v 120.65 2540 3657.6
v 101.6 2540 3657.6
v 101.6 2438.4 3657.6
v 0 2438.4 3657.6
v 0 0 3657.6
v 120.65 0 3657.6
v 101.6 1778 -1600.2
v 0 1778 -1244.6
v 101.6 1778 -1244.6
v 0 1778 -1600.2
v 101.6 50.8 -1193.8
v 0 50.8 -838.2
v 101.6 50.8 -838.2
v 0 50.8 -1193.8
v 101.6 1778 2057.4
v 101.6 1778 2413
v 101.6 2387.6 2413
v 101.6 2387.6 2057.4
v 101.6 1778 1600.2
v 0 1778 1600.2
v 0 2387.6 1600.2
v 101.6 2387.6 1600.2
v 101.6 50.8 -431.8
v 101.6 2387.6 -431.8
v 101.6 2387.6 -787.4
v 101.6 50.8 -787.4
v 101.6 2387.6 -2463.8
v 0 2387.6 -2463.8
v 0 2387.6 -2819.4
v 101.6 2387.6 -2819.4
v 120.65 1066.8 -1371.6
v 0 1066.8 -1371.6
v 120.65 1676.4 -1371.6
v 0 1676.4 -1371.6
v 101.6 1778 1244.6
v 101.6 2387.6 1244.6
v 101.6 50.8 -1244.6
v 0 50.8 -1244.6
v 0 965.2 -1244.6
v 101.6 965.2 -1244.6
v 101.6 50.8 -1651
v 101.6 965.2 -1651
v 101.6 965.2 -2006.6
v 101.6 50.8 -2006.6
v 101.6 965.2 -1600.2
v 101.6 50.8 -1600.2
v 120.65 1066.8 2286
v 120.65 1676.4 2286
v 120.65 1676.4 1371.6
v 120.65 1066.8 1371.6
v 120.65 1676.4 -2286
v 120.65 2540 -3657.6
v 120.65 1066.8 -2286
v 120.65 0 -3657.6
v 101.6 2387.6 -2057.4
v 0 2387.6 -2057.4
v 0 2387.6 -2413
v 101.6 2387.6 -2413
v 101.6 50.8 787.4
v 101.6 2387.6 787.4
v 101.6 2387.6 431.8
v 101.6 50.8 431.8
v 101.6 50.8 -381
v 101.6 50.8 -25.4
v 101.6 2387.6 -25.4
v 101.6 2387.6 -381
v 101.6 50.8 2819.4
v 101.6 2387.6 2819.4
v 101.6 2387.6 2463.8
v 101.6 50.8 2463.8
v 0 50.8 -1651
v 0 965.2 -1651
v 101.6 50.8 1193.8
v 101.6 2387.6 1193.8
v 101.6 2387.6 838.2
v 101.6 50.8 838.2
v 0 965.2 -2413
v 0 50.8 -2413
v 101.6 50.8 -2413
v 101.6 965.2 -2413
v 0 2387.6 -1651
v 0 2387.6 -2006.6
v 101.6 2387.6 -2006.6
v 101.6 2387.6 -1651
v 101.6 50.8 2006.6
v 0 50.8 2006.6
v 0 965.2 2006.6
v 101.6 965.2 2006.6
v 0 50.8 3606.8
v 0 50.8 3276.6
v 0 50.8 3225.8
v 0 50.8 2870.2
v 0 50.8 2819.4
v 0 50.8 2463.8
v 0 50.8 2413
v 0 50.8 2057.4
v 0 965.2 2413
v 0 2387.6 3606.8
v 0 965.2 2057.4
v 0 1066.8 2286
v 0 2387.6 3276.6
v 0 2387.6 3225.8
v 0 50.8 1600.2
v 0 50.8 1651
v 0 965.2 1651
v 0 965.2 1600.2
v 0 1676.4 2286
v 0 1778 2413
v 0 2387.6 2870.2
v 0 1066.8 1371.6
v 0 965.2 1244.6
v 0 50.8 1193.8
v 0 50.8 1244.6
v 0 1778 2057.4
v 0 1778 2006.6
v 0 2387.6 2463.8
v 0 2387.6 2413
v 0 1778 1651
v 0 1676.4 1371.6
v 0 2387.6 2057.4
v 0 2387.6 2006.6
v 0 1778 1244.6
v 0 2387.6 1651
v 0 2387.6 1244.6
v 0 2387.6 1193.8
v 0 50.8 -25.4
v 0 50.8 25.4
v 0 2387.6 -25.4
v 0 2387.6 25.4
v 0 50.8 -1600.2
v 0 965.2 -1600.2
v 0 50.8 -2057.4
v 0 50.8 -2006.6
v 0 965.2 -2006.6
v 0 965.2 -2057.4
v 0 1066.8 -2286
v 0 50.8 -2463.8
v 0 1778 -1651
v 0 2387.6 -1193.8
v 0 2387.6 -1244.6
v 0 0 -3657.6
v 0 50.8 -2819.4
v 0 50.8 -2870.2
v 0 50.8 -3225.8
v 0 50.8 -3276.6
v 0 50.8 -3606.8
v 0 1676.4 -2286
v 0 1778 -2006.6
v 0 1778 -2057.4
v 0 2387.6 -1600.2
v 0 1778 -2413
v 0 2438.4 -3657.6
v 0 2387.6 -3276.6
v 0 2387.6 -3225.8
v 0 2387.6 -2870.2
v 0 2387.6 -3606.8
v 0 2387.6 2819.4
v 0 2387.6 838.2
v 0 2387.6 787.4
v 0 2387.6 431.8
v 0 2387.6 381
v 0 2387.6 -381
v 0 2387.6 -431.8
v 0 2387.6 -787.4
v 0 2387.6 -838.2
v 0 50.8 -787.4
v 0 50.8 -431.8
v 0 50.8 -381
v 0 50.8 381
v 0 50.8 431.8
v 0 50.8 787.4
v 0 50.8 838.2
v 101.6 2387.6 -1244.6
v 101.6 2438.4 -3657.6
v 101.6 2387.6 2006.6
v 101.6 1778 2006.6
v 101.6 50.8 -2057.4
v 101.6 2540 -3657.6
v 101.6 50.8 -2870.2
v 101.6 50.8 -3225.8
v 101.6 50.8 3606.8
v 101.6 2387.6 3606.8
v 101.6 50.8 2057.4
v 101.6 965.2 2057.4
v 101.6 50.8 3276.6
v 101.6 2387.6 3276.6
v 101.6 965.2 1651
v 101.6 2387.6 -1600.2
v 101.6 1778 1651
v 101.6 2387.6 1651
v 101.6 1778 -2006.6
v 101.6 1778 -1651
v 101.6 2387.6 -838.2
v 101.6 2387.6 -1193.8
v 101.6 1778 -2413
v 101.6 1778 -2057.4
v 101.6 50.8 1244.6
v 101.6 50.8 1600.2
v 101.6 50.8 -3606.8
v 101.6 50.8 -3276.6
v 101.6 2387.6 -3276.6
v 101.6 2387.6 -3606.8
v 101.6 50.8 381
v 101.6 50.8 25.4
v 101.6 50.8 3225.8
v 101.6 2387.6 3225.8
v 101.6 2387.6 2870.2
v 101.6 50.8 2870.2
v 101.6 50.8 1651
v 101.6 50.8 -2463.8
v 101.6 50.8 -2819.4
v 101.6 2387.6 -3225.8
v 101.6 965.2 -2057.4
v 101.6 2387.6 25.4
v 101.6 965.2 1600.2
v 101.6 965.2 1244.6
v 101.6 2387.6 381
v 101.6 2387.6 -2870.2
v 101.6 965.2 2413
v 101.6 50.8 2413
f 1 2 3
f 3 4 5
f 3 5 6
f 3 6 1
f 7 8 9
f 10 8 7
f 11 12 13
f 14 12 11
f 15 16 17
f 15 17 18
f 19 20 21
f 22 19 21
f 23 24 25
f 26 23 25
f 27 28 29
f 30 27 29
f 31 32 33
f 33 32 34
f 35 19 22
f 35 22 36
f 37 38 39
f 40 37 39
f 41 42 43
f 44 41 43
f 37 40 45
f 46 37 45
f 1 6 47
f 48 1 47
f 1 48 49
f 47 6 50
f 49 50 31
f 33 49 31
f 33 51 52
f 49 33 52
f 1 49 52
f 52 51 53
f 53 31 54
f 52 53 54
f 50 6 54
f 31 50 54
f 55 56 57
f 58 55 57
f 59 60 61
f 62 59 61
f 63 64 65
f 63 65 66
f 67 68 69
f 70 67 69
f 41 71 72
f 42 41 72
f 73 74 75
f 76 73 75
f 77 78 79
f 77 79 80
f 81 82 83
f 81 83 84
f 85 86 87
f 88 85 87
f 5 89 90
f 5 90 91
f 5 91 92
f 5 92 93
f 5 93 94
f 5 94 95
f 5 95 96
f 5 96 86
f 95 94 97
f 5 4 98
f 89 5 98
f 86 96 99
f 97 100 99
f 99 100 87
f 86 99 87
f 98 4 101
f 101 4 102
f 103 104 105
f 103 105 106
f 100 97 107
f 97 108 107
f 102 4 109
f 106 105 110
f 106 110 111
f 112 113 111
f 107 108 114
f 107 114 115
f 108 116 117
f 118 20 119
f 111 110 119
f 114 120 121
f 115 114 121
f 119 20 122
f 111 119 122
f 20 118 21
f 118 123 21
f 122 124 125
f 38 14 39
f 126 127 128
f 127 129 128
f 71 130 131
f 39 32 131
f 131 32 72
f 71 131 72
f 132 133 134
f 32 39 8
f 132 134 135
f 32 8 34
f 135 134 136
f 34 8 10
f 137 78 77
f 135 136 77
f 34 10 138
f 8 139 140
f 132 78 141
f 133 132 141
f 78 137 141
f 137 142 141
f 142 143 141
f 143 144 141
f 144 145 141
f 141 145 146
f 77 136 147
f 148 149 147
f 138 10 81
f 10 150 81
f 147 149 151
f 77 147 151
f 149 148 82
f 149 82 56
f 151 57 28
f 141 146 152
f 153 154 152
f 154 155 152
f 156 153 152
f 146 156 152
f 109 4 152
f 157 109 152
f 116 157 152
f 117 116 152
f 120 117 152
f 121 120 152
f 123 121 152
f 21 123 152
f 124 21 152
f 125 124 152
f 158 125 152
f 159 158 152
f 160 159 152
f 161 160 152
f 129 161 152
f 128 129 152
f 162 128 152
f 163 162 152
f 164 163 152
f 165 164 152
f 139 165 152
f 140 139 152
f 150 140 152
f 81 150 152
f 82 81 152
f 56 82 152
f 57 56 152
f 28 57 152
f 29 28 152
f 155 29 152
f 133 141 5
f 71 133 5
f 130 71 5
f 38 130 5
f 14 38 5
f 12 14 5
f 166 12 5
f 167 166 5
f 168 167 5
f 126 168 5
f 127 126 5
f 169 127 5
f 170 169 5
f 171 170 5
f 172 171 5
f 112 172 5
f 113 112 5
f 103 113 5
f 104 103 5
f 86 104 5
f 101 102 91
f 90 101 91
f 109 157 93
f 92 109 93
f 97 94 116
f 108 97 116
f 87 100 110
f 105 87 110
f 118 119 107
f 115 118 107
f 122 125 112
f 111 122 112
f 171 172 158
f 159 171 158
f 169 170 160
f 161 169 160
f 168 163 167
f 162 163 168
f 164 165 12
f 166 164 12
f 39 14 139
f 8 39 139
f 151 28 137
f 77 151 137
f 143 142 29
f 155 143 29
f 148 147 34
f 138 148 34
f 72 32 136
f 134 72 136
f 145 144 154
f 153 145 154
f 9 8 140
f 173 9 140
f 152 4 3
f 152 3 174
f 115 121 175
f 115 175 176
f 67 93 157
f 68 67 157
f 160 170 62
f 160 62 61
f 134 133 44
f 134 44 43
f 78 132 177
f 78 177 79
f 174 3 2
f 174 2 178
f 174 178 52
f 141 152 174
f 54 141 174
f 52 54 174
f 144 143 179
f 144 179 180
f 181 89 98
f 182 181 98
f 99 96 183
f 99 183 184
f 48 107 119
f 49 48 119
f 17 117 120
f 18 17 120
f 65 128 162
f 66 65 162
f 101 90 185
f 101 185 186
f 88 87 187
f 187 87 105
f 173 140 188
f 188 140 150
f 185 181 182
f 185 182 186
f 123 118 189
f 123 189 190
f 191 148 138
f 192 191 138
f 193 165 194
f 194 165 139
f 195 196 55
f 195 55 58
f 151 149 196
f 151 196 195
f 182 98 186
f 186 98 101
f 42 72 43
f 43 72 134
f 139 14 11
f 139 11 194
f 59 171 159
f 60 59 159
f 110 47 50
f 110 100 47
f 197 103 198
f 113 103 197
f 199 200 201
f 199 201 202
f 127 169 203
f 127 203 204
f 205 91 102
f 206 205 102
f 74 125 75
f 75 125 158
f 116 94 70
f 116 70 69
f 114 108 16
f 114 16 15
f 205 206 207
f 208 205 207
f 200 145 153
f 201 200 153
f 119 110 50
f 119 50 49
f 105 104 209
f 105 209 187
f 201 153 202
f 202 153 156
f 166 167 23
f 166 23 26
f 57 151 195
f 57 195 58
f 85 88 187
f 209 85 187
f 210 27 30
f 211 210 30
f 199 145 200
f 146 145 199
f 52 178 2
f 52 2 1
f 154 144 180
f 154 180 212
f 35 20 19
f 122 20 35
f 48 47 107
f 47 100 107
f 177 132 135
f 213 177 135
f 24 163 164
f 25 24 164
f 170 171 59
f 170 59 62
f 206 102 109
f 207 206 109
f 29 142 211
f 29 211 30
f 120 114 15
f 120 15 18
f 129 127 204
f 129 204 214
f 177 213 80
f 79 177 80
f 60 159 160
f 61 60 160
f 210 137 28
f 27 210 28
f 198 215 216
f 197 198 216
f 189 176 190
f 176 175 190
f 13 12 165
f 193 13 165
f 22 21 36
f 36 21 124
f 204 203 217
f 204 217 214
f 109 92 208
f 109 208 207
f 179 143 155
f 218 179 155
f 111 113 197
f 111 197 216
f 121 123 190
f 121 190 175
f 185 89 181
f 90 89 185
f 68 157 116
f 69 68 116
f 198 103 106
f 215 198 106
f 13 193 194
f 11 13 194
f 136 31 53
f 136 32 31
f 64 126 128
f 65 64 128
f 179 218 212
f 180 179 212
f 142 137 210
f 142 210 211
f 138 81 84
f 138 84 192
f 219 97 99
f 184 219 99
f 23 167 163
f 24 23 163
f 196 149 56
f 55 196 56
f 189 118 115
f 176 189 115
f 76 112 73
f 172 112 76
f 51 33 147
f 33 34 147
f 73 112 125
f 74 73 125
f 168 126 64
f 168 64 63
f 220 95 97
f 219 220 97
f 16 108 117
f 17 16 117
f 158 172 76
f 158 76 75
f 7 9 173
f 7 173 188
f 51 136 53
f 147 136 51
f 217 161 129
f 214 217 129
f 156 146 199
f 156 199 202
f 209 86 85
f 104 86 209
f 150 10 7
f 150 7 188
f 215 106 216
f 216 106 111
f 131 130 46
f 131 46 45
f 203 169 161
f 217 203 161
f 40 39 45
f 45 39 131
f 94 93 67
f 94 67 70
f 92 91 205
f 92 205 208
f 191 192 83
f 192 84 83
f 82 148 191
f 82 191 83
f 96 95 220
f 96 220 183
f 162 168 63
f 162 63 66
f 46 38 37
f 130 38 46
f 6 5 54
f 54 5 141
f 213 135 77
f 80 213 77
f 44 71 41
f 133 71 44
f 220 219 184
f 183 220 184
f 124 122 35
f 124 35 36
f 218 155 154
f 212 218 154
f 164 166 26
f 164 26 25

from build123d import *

# Parameters (mm, degrees)
SKETCH1_W           = 330.2
SKETCH1_H           = 2336.8
SKETCH1_W_2         = 914.4
SKETCH1_H_2         = 609.6
SKETCH1_W_3         = 355.6
SKETCH1_H_3         = 914.4
BOSS_EXTRUDE1_DEPTH = 101.6
SKETCH2_W           = 7315.2
SKETCH2_H           = 2438.4
SKETCH2_W_2         = 914.4
SKETCH2_H_2         = 609.6
BOSS_EXTRUDE2_DEPTH = 19.05
SKETCH3_W           = 19.05
SKETCH3_H           = 7315.2
BOSS_EXTRUDE3_DEPTH = 101.6


with BuildPart() as part:
    # Sketch1 → Boss-Extrude1 (new body)
    with BuildSketch(Plane(origin=(0, 0, 0), x_dir=(0, 0, -1), z_dir=(1, 0, 0))):
        Polygon((0, 0), (3657.6, 0), (3657.6, 2438.4), (-3657.6, 2438.4), (-3657.6, 0), align=None)
        Polygon((1828.8, 1778), (2006.6, 1778), (2006.6, 2387.6), (1651, 2387.6), (1651, 1778), align=None, mode=Mode.SUBTRACT)
        with Locations((-3441.7, 1219.2)):
            Rectangle(SKETCH1_W, SKETCH1_H, mode=Mode.SUBTRACT)
        with Locations((3441.7, 1219.2)):
            Rectangle(SKETCH1_W, SKETCH1_H, mode=Mode.SUBTRACT)
        Polygon((-1828.8, 1778), (-1651, 1778), (-1651, 2387.6), (-2006.6, 2387.6), (-2006.6, 1778), align=None, mode=Mode.SUBTRACT)
        with Locations((-1828.8, 1371.6)):
            Rectangle(SKETCH1_W_2, SKETCH1_H_2, mode=Mode.SUBTRACT)
        Polygon((1828.8, 1676.4), (1371.6, 1676.4), (1371.6, 1066.8), (2286, 1066.8), (2286, 1676.4), align=None, mode=Mode.SUBTRACT)
        with Locations((203.2, 1219.2)):
            Rectangle(SKETCH1_W_3, SKETCH1_H, mode=Mode.SUBTRACT)
        with Locations((-203.2, 1219.2)):
            Rectangle(SKETCH1_W_3, SKETCH1_H, mode=Mode.SUBTRACT)
        with Locations((609.6, 1219.2)):
            Rectangle(SKETCH1_W_3, SKETCH1_H, mode=Mode.SUBTRACT)
        with Locations((1016, 1219.2)):
            Rectangle(SKETCH1_W_3, SKETCH1_H, mode=Mode.SUBTRACT)
        with Locations((1422.4, 508)):
            Rectangle(SKETCH1_W_3, SKETCH1_H_3, mode=Mode.SUBTRACT)
        with Locations((1828.8, 508)):
            Rectangle(SKETCH1_W_3, SKETCH1_H_3, mode=Mode.SUBTRACT)
        with Locations((2235.2, 508)):
            Rectangle(SKETCH1_W_3, SKETCH1_H_3, mode=Mode.SUBTRACT)
        with Locations((2641.6, 1219.2)):
            Rectangle(SKETCH1_W_3, SKETCH1_H, mode=Mode.SUBTRACT)
        with Locations((3048, 1219.2)):
            Rectangle(SKETCH1_W_3, SKETCH1_H, mode=Mode.SUBTRACT)
        with Locations((1422.4, 2082.8)):
            Rectangle(SKETCH1_W_3, SKETCH1_H_2, mode=Mode.SUBTRACT)
        with Locations((2235.2, 2082.8)):
            Rectangle(SKETCH1_W_3, SKETCH1_H_2, mode=Mode.SUBTRACT)
        with Locations((-609.6, 1219.2)):
            Rectangle(SKETCH1_W_3, SKETCH1_H, mode=Mode.SUBTRACT)
        with Locations((-1016, 1219.2)):
            Rectangle(SKETCH1_W_3, SKETCH1_H, mode=Mode.SUBTRACT)
        with Locations((-1422.4, 508)):
            Rectangle(SKETCH1_W_3, SKETCH1_H_3, mode=Mode.SUBTRACT)
        with Locations((-1828.8, 508)):
            Rectangle(SKETCH1_W_3, SKETCH1_H_3, mode=Mode.SUBTRACT)
        with Locations((-2235.2, 508)):
            Rectangle(SKETCH1_W_3, SKETCH1_H_3, mode=Mode.SUBTRACT)
        with Locations((-2641.6, 1219.2)):
            Rectangle(SKETCH1_W_3, SKETCH1_H, mode=Mode.SUBTRACT)
        with Locations((-3048, 1219.2)):
            Rectangle(SKETCH1_W_3, SKETCH1_H, mode=Mode.SUBTRACT)
        with Locations((-2235.2, 2082.8)):
            Rectangle(SKETCH1_W_3, SKETCH1_H_2, mode=Mode.SUBTRACT)
        with Locations((-1422.4, 2082.8)):
            Rectangle(SKETCH1_W_3, SKETCH1_H_2, mode=Mode.SUBTRACT)
    extrude(amount=BOSS_EXTRUDE1_DEPTH)

    # Sketch2 → Boss-Extrude2 (add)
    with BuildSketch(Plane(origin=(101.6, 0, 0), x_dir=(0, 0, -1), z_dir=(1, 0, 0))):
        with Locations((0, 1219.2)):
            Rectangle(SKETCH2_W, SKETCH2_H)
        with Locations((1828.8, 1371.6)):
            Rectangle(SKETCH2_W_2, SKETCH2_H_2, mode=Mode.SUBTRACT)
        with Locations((-1828.8, 1371.6)):
            Rectangle(SKETCH2_W_2, SKETCH2_H_2, mode=Mode.SUBTRACT)
    extrude(amount=BOSS_EXTRUDE2_DEPTH)

    # Sketch3 → Boss-Extrude3 (add)
    with BuildSketch(Plane(origin=(0, 2438.4, 0), x_dir=(1, 0, 0), z_dir=(0, 1, 0))):
        with Locations((111.125, 0)):
            Rectangle(SKETCH3_W, SKETCH3_H)
    extrude(amount=BOSS_EXTRUDE3_DEPTH)


solid = part.part
